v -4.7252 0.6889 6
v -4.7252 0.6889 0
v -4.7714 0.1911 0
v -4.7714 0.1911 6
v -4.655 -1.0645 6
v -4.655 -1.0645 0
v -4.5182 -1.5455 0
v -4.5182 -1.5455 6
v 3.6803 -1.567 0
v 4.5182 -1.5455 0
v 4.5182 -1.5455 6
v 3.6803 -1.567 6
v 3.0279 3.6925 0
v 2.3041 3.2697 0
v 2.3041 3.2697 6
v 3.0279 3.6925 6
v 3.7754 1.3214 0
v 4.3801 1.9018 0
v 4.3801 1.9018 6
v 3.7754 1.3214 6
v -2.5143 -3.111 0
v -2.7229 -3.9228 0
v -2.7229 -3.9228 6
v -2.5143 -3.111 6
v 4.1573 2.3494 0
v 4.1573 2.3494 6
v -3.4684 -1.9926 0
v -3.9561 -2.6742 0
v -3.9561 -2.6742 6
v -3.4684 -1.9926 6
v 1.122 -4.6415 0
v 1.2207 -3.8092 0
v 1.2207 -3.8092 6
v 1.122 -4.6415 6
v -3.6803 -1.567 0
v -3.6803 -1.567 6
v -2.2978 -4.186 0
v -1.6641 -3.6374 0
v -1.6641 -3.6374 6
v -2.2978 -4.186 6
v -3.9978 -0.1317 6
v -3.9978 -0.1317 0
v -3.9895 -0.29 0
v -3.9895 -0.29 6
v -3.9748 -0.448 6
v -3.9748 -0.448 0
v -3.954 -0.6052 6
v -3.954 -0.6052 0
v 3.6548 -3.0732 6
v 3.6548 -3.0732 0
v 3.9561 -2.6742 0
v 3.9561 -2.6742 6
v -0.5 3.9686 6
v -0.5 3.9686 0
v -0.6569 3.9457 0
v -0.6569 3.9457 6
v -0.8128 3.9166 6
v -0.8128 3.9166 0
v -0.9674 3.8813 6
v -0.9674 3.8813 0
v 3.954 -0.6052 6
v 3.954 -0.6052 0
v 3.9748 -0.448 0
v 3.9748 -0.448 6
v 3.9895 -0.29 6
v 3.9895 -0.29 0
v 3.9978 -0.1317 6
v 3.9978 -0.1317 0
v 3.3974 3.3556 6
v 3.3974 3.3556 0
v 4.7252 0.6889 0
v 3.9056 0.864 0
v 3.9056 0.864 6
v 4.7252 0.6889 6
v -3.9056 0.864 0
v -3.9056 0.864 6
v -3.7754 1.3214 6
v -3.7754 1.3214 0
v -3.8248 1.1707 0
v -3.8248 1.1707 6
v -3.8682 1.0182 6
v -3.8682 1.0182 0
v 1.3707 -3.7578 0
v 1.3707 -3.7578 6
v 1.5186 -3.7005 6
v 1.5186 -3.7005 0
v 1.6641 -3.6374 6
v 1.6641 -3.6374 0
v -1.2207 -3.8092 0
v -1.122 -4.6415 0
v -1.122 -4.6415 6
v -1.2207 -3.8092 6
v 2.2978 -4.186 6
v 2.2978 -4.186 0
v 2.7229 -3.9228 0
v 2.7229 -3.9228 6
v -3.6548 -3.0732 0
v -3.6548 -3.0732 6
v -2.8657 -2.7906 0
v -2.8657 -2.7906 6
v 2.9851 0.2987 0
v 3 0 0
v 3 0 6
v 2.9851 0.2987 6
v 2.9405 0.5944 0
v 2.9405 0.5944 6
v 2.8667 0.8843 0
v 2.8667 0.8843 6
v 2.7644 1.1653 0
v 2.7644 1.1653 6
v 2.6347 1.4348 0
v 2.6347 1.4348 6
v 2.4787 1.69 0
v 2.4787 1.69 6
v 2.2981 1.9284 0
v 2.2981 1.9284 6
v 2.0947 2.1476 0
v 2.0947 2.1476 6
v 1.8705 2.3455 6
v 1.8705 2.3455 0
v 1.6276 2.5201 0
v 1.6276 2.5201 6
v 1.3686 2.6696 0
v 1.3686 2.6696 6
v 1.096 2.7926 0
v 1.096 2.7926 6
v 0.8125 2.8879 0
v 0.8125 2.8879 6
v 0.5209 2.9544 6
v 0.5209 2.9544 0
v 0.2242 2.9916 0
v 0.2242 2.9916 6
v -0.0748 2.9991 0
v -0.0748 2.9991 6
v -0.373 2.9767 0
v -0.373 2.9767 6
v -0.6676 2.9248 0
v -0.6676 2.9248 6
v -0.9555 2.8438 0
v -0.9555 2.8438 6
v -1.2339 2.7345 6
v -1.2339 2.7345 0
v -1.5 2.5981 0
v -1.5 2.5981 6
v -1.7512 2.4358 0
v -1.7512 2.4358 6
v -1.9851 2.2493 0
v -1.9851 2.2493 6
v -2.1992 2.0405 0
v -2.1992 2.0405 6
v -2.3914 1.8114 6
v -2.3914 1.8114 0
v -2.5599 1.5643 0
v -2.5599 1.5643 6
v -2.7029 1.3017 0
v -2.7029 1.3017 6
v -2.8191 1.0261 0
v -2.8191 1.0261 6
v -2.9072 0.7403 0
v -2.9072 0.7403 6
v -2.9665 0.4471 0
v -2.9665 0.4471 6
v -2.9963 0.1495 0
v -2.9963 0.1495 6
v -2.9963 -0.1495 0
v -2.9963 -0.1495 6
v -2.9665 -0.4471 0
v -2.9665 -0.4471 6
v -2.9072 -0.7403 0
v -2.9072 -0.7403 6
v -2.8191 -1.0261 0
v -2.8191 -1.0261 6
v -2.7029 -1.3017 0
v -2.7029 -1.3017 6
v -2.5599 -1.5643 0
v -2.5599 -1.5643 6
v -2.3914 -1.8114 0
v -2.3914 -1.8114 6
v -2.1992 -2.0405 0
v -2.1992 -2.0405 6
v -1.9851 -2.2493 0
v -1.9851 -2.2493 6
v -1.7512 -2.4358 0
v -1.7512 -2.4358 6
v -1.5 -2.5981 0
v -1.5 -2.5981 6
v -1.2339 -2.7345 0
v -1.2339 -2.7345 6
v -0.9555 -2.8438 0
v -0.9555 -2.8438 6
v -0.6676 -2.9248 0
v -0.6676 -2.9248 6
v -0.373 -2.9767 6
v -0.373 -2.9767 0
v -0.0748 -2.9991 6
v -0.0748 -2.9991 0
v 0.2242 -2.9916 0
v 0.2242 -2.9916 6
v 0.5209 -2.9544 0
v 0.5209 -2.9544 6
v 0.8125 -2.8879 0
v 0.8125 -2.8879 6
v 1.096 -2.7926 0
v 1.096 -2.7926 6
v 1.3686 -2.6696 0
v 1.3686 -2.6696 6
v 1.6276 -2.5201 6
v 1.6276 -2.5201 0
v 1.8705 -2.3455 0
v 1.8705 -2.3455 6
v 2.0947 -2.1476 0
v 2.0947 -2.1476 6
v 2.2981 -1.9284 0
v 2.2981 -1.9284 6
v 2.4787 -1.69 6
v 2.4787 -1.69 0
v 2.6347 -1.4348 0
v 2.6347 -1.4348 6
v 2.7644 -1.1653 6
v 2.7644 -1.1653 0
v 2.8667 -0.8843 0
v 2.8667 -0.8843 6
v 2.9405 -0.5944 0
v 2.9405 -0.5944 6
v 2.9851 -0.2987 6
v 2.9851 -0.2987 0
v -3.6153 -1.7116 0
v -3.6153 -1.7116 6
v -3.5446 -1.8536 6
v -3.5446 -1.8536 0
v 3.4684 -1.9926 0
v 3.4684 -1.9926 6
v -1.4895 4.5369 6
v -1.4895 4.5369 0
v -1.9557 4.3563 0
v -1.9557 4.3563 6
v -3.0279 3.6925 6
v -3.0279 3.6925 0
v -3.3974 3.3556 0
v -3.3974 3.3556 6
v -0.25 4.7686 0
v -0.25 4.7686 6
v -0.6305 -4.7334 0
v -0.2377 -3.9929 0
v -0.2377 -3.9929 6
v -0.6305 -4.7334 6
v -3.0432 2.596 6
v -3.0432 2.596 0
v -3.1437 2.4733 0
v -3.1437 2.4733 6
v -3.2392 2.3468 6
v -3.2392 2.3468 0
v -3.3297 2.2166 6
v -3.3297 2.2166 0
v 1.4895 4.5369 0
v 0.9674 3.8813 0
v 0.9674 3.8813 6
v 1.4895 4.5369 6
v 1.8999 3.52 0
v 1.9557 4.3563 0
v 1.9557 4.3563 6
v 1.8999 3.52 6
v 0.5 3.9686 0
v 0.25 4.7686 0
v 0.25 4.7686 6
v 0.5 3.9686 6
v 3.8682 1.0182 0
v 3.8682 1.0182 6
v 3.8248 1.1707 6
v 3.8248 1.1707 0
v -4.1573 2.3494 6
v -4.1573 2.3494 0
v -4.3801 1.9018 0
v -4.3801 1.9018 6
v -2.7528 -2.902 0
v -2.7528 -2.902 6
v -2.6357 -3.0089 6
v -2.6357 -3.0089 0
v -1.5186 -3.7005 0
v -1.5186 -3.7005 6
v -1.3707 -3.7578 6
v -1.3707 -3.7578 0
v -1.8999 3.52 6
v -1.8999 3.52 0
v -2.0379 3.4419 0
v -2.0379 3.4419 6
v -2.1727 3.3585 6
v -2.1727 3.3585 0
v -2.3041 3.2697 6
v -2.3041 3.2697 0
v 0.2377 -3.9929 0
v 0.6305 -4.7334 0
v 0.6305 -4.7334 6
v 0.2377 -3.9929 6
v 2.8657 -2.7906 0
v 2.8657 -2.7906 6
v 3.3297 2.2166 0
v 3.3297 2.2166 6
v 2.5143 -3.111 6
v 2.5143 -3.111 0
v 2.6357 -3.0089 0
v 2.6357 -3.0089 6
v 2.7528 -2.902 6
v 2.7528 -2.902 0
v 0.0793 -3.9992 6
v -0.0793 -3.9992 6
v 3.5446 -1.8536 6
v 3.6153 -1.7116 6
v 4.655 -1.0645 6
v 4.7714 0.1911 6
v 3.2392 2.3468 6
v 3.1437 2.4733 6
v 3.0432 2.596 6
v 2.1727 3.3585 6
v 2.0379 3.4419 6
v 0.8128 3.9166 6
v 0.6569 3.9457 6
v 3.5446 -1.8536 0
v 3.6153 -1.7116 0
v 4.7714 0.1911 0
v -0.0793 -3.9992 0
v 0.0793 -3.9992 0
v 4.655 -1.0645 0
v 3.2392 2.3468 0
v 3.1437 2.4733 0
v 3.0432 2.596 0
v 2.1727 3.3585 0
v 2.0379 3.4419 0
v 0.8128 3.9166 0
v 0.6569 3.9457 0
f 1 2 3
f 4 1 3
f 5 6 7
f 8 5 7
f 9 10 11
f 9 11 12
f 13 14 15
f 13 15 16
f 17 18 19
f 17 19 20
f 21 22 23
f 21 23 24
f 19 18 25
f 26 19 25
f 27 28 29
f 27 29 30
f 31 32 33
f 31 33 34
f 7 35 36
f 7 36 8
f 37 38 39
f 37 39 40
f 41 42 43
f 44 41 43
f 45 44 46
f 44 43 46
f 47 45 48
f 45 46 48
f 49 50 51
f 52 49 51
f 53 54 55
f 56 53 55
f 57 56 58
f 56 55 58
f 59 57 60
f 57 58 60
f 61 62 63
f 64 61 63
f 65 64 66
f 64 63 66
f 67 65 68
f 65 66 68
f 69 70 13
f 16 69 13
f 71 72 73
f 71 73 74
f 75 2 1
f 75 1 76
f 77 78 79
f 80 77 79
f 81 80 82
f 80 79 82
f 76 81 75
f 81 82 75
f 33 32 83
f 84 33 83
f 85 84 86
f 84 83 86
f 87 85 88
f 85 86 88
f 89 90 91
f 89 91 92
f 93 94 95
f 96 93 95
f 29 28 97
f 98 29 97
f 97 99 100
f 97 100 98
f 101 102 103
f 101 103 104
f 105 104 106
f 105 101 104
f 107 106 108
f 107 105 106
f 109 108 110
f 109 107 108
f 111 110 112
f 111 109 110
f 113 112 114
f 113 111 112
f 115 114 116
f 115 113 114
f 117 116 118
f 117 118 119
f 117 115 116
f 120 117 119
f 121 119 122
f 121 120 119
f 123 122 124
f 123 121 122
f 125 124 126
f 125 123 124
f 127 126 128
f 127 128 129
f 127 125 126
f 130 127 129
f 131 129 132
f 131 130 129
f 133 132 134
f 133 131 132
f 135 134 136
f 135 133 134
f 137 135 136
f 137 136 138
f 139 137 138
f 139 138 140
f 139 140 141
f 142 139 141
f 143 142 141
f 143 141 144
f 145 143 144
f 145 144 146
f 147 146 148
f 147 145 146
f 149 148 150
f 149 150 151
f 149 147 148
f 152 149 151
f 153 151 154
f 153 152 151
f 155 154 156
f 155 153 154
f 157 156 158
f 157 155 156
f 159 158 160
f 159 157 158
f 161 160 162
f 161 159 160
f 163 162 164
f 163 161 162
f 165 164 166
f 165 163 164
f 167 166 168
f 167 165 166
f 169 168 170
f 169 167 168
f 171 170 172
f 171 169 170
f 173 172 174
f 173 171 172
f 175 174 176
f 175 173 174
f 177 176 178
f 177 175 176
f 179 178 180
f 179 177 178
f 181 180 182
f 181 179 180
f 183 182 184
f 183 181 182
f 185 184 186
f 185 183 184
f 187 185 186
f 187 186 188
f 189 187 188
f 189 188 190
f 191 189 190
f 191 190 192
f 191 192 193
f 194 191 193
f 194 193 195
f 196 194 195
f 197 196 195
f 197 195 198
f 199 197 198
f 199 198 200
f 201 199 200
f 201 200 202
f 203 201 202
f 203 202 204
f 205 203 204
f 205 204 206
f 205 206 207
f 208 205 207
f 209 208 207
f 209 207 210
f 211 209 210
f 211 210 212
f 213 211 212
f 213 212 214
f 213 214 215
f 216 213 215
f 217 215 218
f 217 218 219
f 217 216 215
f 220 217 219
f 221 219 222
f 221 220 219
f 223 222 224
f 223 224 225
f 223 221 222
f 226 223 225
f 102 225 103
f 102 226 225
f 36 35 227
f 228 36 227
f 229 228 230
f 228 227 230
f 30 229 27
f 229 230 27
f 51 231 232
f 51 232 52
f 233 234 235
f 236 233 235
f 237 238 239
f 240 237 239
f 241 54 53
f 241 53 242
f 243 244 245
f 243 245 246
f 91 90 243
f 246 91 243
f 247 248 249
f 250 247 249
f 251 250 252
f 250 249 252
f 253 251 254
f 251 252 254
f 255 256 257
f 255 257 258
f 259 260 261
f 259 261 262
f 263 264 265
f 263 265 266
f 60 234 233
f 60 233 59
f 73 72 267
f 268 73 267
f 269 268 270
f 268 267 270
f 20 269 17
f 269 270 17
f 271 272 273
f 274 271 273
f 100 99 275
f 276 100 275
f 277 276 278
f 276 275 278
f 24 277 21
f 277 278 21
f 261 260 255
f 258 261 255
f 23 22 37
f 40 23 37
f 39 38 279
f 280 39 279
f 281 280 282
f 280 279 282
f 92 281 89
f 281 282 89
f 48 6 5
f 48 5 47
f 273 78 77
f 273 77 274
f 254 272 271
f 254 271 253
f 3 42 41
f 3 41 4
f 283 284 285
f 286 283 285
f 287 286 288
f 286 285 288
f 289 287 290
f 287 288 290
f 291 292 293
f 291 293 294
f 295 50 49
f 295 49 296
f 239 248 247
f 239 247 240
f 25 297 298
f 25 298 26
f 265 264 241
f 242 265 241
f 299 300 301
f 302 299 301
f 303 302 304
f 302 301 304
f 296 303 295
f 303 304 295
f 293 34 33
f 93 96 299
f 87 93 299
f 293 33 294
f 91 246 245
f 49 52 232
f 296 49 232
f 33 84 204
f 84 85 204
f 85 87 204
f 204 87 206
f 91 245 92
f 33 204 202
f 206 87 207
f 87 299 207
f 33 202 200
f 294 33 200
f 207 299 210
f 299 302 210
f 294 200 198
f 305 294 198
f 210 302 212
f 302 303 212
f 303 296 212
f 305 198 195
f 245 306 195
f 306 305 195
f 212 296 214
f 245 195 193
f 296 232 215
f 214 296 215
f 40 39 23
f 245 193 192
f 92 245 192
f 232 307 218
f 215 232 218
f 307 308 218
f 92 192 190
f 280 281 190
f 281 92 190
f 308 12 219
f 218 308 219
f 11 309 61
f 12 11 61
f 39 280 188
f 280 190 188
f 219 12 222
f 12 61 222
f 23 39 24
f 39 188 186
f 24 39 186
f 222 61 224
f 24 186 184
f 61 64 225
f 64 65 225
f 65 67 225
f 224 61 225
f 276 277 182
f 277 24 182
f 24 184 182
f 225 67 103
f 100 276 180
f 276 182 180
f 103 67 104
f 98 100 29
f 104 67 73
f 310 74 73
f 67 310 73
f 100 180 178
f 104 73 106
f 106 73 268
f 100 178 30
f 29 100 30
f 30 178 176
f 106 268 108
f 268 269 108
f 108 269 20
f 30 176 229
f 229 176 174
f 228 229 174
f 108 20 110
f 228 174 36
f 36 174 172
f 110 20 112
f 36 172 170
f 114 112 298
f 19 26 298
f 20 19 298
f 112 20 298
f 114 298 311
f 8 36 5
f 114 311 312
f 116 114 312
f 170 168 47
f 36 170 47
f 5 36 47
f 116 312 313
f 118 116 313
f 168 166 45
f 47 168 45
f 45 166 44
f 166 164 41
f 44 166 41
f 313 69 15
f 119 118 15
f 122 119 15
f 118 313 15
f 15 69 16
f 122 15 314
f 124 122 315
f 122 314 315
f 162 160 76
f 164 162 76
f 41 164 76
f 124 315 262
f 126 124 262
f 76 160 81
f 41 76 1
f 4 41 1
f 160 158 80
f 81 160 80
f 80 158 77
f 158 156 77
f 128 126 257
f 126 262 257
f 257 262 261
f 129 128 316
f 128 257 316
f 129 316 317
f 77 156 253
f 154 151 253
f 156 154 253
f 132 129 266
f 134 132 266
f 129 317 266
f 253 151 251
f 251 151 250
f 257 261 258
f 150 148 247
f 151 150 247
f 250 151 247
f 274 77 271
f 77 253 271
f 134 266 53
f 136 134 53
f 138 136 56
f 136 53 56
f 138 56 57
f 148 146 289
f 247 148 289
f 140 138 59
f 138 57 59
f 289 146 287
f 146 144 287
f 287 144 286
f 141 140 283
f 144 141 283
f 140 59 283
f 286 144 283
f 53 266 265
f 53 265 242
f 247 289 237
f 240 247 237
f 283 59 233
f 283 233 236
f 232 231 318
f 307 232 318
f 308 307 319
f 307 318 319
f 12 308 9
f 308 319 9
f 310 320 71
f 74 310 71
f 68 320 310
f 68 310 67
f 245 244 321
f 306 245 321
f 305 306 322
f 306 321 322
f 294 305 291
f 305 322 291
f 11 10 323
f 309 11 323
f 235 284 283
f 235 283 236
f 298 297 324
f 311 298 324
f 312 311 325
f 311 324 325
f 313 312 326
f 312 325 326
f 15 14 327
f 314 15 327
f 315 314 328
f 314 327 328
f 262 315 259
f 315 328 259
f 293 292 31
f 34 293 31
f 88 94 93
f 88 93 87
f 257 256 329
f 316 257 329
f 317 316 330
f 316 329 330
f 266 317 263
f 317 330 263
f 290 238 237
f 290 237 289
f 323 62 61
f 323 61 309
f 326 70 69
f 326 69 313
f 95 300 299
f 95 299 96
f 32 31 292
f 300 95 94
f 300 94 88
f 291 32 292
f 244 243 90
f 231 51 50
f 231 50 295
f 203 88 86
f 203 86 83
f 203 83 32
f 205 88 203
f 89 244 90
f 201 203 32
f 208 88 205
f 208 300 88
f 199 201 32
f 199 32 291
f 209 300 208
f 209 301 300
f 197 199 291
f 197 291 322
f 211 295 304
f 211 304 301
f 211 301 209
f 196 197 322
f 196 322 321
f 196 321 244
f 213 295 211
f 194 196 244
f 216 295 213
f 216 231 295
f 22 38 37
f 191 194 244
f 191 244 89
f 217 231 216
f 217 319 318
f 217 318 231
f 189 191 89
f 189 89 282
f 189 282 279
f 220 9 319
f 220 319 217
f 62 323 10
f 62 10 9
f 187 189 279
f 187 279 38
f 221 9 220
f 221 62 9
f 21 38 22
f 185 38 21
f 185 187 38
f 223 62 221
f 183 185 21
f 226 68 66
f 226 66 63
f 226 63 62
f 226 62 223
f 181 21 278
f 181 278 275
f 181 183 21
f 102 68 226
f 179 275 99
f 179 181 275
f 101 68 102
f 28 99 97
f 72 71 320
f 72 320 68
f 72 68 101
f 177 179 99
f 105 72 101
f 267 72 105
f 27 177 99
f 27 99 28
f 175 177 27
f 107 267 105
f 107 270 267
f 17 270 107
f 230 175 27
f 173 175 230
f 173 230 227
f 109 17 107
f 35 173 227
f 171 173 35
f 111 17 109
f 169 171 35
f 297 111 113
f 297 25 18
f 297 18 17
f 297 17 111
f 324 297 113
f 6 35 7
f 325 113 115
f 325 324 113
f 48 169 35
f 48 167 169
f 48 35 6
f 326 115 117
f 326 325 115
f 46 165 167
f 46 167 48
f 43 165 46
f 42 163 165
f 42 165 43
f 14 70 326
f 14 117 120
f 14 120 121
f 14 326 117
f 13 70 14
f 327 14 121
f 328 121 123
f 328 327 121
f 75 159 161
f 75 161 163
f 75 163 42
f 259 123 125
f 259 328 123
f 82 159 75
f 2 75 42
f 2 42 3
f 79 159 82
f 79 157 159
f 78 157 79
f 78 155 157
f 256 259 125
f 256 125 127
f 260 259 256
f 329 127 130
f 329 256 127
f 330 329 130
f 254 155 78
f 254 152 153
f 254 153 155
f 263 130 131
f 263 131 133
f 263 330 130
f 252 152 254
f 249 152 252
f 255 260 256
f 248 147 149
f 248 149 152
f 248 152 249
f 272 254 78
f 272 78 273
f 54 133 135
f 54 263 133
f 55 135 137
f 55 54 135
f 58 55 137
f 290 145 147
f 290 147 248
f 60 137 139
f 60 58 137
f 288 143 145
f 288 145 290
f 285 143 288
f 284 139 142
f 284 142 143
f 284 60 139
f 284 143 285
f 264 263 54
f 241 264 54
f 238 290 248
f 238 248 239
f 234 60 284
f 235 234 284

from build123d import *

# Parameters (mm, degrees)
SKETCH1_R           = 4
BOSS_EXTRUDE1_DEPTH = 6
BOSS_EXTRUDE2_DEPTH = 6
CIRPATTERN1_COUNT   = 17
SKETCH5_R           = 3
CUT_EXTRUDE1_DEPTH  = 6


with BuildPart() as part:
    # Sketch1 → Boss-Extrude1 (new body)
    with BuildSketch(Plane.XY):
        Circle(SKETCH1_R)
    extrude(amount=BOSS_EXTRUDE1_DEPTH)

    # Sketch3 → Boss-Extrude2 (add)
    with BuildSketch(Plane.XY):
        Polygon((0, 4.768626967), (0.25, 4.768626967), (0.5, 3.968626967), (-0.5, 3.968626967), (-0.25, 4.768626967), align=None)
    boss_extrude2 = extrude(amount=BOSS_EXTRUDE2_DEPTH)

    # CirPattern1: Boss-Extrude2 ×17 about axis
    cirpattern1_axis = Axis((0, 0, 0), (0, 0, 1))
    for i in range(1, CIRPATTERN1_COUNT):
        add(boss_extrude2.rotate(cirpattern1_axis, i * 360 / CIRPATTERN1_COUNT))

    # Sketch5 → Cut-Extrude1 (cut)
    with BuildSketch(Plane.XY):
        Circle(SKETCH5_R)
    extrude(amount=CUT_EXTRUDE1_DEPTH, mode=Mode.SUBTRACT)


solid = part.part
